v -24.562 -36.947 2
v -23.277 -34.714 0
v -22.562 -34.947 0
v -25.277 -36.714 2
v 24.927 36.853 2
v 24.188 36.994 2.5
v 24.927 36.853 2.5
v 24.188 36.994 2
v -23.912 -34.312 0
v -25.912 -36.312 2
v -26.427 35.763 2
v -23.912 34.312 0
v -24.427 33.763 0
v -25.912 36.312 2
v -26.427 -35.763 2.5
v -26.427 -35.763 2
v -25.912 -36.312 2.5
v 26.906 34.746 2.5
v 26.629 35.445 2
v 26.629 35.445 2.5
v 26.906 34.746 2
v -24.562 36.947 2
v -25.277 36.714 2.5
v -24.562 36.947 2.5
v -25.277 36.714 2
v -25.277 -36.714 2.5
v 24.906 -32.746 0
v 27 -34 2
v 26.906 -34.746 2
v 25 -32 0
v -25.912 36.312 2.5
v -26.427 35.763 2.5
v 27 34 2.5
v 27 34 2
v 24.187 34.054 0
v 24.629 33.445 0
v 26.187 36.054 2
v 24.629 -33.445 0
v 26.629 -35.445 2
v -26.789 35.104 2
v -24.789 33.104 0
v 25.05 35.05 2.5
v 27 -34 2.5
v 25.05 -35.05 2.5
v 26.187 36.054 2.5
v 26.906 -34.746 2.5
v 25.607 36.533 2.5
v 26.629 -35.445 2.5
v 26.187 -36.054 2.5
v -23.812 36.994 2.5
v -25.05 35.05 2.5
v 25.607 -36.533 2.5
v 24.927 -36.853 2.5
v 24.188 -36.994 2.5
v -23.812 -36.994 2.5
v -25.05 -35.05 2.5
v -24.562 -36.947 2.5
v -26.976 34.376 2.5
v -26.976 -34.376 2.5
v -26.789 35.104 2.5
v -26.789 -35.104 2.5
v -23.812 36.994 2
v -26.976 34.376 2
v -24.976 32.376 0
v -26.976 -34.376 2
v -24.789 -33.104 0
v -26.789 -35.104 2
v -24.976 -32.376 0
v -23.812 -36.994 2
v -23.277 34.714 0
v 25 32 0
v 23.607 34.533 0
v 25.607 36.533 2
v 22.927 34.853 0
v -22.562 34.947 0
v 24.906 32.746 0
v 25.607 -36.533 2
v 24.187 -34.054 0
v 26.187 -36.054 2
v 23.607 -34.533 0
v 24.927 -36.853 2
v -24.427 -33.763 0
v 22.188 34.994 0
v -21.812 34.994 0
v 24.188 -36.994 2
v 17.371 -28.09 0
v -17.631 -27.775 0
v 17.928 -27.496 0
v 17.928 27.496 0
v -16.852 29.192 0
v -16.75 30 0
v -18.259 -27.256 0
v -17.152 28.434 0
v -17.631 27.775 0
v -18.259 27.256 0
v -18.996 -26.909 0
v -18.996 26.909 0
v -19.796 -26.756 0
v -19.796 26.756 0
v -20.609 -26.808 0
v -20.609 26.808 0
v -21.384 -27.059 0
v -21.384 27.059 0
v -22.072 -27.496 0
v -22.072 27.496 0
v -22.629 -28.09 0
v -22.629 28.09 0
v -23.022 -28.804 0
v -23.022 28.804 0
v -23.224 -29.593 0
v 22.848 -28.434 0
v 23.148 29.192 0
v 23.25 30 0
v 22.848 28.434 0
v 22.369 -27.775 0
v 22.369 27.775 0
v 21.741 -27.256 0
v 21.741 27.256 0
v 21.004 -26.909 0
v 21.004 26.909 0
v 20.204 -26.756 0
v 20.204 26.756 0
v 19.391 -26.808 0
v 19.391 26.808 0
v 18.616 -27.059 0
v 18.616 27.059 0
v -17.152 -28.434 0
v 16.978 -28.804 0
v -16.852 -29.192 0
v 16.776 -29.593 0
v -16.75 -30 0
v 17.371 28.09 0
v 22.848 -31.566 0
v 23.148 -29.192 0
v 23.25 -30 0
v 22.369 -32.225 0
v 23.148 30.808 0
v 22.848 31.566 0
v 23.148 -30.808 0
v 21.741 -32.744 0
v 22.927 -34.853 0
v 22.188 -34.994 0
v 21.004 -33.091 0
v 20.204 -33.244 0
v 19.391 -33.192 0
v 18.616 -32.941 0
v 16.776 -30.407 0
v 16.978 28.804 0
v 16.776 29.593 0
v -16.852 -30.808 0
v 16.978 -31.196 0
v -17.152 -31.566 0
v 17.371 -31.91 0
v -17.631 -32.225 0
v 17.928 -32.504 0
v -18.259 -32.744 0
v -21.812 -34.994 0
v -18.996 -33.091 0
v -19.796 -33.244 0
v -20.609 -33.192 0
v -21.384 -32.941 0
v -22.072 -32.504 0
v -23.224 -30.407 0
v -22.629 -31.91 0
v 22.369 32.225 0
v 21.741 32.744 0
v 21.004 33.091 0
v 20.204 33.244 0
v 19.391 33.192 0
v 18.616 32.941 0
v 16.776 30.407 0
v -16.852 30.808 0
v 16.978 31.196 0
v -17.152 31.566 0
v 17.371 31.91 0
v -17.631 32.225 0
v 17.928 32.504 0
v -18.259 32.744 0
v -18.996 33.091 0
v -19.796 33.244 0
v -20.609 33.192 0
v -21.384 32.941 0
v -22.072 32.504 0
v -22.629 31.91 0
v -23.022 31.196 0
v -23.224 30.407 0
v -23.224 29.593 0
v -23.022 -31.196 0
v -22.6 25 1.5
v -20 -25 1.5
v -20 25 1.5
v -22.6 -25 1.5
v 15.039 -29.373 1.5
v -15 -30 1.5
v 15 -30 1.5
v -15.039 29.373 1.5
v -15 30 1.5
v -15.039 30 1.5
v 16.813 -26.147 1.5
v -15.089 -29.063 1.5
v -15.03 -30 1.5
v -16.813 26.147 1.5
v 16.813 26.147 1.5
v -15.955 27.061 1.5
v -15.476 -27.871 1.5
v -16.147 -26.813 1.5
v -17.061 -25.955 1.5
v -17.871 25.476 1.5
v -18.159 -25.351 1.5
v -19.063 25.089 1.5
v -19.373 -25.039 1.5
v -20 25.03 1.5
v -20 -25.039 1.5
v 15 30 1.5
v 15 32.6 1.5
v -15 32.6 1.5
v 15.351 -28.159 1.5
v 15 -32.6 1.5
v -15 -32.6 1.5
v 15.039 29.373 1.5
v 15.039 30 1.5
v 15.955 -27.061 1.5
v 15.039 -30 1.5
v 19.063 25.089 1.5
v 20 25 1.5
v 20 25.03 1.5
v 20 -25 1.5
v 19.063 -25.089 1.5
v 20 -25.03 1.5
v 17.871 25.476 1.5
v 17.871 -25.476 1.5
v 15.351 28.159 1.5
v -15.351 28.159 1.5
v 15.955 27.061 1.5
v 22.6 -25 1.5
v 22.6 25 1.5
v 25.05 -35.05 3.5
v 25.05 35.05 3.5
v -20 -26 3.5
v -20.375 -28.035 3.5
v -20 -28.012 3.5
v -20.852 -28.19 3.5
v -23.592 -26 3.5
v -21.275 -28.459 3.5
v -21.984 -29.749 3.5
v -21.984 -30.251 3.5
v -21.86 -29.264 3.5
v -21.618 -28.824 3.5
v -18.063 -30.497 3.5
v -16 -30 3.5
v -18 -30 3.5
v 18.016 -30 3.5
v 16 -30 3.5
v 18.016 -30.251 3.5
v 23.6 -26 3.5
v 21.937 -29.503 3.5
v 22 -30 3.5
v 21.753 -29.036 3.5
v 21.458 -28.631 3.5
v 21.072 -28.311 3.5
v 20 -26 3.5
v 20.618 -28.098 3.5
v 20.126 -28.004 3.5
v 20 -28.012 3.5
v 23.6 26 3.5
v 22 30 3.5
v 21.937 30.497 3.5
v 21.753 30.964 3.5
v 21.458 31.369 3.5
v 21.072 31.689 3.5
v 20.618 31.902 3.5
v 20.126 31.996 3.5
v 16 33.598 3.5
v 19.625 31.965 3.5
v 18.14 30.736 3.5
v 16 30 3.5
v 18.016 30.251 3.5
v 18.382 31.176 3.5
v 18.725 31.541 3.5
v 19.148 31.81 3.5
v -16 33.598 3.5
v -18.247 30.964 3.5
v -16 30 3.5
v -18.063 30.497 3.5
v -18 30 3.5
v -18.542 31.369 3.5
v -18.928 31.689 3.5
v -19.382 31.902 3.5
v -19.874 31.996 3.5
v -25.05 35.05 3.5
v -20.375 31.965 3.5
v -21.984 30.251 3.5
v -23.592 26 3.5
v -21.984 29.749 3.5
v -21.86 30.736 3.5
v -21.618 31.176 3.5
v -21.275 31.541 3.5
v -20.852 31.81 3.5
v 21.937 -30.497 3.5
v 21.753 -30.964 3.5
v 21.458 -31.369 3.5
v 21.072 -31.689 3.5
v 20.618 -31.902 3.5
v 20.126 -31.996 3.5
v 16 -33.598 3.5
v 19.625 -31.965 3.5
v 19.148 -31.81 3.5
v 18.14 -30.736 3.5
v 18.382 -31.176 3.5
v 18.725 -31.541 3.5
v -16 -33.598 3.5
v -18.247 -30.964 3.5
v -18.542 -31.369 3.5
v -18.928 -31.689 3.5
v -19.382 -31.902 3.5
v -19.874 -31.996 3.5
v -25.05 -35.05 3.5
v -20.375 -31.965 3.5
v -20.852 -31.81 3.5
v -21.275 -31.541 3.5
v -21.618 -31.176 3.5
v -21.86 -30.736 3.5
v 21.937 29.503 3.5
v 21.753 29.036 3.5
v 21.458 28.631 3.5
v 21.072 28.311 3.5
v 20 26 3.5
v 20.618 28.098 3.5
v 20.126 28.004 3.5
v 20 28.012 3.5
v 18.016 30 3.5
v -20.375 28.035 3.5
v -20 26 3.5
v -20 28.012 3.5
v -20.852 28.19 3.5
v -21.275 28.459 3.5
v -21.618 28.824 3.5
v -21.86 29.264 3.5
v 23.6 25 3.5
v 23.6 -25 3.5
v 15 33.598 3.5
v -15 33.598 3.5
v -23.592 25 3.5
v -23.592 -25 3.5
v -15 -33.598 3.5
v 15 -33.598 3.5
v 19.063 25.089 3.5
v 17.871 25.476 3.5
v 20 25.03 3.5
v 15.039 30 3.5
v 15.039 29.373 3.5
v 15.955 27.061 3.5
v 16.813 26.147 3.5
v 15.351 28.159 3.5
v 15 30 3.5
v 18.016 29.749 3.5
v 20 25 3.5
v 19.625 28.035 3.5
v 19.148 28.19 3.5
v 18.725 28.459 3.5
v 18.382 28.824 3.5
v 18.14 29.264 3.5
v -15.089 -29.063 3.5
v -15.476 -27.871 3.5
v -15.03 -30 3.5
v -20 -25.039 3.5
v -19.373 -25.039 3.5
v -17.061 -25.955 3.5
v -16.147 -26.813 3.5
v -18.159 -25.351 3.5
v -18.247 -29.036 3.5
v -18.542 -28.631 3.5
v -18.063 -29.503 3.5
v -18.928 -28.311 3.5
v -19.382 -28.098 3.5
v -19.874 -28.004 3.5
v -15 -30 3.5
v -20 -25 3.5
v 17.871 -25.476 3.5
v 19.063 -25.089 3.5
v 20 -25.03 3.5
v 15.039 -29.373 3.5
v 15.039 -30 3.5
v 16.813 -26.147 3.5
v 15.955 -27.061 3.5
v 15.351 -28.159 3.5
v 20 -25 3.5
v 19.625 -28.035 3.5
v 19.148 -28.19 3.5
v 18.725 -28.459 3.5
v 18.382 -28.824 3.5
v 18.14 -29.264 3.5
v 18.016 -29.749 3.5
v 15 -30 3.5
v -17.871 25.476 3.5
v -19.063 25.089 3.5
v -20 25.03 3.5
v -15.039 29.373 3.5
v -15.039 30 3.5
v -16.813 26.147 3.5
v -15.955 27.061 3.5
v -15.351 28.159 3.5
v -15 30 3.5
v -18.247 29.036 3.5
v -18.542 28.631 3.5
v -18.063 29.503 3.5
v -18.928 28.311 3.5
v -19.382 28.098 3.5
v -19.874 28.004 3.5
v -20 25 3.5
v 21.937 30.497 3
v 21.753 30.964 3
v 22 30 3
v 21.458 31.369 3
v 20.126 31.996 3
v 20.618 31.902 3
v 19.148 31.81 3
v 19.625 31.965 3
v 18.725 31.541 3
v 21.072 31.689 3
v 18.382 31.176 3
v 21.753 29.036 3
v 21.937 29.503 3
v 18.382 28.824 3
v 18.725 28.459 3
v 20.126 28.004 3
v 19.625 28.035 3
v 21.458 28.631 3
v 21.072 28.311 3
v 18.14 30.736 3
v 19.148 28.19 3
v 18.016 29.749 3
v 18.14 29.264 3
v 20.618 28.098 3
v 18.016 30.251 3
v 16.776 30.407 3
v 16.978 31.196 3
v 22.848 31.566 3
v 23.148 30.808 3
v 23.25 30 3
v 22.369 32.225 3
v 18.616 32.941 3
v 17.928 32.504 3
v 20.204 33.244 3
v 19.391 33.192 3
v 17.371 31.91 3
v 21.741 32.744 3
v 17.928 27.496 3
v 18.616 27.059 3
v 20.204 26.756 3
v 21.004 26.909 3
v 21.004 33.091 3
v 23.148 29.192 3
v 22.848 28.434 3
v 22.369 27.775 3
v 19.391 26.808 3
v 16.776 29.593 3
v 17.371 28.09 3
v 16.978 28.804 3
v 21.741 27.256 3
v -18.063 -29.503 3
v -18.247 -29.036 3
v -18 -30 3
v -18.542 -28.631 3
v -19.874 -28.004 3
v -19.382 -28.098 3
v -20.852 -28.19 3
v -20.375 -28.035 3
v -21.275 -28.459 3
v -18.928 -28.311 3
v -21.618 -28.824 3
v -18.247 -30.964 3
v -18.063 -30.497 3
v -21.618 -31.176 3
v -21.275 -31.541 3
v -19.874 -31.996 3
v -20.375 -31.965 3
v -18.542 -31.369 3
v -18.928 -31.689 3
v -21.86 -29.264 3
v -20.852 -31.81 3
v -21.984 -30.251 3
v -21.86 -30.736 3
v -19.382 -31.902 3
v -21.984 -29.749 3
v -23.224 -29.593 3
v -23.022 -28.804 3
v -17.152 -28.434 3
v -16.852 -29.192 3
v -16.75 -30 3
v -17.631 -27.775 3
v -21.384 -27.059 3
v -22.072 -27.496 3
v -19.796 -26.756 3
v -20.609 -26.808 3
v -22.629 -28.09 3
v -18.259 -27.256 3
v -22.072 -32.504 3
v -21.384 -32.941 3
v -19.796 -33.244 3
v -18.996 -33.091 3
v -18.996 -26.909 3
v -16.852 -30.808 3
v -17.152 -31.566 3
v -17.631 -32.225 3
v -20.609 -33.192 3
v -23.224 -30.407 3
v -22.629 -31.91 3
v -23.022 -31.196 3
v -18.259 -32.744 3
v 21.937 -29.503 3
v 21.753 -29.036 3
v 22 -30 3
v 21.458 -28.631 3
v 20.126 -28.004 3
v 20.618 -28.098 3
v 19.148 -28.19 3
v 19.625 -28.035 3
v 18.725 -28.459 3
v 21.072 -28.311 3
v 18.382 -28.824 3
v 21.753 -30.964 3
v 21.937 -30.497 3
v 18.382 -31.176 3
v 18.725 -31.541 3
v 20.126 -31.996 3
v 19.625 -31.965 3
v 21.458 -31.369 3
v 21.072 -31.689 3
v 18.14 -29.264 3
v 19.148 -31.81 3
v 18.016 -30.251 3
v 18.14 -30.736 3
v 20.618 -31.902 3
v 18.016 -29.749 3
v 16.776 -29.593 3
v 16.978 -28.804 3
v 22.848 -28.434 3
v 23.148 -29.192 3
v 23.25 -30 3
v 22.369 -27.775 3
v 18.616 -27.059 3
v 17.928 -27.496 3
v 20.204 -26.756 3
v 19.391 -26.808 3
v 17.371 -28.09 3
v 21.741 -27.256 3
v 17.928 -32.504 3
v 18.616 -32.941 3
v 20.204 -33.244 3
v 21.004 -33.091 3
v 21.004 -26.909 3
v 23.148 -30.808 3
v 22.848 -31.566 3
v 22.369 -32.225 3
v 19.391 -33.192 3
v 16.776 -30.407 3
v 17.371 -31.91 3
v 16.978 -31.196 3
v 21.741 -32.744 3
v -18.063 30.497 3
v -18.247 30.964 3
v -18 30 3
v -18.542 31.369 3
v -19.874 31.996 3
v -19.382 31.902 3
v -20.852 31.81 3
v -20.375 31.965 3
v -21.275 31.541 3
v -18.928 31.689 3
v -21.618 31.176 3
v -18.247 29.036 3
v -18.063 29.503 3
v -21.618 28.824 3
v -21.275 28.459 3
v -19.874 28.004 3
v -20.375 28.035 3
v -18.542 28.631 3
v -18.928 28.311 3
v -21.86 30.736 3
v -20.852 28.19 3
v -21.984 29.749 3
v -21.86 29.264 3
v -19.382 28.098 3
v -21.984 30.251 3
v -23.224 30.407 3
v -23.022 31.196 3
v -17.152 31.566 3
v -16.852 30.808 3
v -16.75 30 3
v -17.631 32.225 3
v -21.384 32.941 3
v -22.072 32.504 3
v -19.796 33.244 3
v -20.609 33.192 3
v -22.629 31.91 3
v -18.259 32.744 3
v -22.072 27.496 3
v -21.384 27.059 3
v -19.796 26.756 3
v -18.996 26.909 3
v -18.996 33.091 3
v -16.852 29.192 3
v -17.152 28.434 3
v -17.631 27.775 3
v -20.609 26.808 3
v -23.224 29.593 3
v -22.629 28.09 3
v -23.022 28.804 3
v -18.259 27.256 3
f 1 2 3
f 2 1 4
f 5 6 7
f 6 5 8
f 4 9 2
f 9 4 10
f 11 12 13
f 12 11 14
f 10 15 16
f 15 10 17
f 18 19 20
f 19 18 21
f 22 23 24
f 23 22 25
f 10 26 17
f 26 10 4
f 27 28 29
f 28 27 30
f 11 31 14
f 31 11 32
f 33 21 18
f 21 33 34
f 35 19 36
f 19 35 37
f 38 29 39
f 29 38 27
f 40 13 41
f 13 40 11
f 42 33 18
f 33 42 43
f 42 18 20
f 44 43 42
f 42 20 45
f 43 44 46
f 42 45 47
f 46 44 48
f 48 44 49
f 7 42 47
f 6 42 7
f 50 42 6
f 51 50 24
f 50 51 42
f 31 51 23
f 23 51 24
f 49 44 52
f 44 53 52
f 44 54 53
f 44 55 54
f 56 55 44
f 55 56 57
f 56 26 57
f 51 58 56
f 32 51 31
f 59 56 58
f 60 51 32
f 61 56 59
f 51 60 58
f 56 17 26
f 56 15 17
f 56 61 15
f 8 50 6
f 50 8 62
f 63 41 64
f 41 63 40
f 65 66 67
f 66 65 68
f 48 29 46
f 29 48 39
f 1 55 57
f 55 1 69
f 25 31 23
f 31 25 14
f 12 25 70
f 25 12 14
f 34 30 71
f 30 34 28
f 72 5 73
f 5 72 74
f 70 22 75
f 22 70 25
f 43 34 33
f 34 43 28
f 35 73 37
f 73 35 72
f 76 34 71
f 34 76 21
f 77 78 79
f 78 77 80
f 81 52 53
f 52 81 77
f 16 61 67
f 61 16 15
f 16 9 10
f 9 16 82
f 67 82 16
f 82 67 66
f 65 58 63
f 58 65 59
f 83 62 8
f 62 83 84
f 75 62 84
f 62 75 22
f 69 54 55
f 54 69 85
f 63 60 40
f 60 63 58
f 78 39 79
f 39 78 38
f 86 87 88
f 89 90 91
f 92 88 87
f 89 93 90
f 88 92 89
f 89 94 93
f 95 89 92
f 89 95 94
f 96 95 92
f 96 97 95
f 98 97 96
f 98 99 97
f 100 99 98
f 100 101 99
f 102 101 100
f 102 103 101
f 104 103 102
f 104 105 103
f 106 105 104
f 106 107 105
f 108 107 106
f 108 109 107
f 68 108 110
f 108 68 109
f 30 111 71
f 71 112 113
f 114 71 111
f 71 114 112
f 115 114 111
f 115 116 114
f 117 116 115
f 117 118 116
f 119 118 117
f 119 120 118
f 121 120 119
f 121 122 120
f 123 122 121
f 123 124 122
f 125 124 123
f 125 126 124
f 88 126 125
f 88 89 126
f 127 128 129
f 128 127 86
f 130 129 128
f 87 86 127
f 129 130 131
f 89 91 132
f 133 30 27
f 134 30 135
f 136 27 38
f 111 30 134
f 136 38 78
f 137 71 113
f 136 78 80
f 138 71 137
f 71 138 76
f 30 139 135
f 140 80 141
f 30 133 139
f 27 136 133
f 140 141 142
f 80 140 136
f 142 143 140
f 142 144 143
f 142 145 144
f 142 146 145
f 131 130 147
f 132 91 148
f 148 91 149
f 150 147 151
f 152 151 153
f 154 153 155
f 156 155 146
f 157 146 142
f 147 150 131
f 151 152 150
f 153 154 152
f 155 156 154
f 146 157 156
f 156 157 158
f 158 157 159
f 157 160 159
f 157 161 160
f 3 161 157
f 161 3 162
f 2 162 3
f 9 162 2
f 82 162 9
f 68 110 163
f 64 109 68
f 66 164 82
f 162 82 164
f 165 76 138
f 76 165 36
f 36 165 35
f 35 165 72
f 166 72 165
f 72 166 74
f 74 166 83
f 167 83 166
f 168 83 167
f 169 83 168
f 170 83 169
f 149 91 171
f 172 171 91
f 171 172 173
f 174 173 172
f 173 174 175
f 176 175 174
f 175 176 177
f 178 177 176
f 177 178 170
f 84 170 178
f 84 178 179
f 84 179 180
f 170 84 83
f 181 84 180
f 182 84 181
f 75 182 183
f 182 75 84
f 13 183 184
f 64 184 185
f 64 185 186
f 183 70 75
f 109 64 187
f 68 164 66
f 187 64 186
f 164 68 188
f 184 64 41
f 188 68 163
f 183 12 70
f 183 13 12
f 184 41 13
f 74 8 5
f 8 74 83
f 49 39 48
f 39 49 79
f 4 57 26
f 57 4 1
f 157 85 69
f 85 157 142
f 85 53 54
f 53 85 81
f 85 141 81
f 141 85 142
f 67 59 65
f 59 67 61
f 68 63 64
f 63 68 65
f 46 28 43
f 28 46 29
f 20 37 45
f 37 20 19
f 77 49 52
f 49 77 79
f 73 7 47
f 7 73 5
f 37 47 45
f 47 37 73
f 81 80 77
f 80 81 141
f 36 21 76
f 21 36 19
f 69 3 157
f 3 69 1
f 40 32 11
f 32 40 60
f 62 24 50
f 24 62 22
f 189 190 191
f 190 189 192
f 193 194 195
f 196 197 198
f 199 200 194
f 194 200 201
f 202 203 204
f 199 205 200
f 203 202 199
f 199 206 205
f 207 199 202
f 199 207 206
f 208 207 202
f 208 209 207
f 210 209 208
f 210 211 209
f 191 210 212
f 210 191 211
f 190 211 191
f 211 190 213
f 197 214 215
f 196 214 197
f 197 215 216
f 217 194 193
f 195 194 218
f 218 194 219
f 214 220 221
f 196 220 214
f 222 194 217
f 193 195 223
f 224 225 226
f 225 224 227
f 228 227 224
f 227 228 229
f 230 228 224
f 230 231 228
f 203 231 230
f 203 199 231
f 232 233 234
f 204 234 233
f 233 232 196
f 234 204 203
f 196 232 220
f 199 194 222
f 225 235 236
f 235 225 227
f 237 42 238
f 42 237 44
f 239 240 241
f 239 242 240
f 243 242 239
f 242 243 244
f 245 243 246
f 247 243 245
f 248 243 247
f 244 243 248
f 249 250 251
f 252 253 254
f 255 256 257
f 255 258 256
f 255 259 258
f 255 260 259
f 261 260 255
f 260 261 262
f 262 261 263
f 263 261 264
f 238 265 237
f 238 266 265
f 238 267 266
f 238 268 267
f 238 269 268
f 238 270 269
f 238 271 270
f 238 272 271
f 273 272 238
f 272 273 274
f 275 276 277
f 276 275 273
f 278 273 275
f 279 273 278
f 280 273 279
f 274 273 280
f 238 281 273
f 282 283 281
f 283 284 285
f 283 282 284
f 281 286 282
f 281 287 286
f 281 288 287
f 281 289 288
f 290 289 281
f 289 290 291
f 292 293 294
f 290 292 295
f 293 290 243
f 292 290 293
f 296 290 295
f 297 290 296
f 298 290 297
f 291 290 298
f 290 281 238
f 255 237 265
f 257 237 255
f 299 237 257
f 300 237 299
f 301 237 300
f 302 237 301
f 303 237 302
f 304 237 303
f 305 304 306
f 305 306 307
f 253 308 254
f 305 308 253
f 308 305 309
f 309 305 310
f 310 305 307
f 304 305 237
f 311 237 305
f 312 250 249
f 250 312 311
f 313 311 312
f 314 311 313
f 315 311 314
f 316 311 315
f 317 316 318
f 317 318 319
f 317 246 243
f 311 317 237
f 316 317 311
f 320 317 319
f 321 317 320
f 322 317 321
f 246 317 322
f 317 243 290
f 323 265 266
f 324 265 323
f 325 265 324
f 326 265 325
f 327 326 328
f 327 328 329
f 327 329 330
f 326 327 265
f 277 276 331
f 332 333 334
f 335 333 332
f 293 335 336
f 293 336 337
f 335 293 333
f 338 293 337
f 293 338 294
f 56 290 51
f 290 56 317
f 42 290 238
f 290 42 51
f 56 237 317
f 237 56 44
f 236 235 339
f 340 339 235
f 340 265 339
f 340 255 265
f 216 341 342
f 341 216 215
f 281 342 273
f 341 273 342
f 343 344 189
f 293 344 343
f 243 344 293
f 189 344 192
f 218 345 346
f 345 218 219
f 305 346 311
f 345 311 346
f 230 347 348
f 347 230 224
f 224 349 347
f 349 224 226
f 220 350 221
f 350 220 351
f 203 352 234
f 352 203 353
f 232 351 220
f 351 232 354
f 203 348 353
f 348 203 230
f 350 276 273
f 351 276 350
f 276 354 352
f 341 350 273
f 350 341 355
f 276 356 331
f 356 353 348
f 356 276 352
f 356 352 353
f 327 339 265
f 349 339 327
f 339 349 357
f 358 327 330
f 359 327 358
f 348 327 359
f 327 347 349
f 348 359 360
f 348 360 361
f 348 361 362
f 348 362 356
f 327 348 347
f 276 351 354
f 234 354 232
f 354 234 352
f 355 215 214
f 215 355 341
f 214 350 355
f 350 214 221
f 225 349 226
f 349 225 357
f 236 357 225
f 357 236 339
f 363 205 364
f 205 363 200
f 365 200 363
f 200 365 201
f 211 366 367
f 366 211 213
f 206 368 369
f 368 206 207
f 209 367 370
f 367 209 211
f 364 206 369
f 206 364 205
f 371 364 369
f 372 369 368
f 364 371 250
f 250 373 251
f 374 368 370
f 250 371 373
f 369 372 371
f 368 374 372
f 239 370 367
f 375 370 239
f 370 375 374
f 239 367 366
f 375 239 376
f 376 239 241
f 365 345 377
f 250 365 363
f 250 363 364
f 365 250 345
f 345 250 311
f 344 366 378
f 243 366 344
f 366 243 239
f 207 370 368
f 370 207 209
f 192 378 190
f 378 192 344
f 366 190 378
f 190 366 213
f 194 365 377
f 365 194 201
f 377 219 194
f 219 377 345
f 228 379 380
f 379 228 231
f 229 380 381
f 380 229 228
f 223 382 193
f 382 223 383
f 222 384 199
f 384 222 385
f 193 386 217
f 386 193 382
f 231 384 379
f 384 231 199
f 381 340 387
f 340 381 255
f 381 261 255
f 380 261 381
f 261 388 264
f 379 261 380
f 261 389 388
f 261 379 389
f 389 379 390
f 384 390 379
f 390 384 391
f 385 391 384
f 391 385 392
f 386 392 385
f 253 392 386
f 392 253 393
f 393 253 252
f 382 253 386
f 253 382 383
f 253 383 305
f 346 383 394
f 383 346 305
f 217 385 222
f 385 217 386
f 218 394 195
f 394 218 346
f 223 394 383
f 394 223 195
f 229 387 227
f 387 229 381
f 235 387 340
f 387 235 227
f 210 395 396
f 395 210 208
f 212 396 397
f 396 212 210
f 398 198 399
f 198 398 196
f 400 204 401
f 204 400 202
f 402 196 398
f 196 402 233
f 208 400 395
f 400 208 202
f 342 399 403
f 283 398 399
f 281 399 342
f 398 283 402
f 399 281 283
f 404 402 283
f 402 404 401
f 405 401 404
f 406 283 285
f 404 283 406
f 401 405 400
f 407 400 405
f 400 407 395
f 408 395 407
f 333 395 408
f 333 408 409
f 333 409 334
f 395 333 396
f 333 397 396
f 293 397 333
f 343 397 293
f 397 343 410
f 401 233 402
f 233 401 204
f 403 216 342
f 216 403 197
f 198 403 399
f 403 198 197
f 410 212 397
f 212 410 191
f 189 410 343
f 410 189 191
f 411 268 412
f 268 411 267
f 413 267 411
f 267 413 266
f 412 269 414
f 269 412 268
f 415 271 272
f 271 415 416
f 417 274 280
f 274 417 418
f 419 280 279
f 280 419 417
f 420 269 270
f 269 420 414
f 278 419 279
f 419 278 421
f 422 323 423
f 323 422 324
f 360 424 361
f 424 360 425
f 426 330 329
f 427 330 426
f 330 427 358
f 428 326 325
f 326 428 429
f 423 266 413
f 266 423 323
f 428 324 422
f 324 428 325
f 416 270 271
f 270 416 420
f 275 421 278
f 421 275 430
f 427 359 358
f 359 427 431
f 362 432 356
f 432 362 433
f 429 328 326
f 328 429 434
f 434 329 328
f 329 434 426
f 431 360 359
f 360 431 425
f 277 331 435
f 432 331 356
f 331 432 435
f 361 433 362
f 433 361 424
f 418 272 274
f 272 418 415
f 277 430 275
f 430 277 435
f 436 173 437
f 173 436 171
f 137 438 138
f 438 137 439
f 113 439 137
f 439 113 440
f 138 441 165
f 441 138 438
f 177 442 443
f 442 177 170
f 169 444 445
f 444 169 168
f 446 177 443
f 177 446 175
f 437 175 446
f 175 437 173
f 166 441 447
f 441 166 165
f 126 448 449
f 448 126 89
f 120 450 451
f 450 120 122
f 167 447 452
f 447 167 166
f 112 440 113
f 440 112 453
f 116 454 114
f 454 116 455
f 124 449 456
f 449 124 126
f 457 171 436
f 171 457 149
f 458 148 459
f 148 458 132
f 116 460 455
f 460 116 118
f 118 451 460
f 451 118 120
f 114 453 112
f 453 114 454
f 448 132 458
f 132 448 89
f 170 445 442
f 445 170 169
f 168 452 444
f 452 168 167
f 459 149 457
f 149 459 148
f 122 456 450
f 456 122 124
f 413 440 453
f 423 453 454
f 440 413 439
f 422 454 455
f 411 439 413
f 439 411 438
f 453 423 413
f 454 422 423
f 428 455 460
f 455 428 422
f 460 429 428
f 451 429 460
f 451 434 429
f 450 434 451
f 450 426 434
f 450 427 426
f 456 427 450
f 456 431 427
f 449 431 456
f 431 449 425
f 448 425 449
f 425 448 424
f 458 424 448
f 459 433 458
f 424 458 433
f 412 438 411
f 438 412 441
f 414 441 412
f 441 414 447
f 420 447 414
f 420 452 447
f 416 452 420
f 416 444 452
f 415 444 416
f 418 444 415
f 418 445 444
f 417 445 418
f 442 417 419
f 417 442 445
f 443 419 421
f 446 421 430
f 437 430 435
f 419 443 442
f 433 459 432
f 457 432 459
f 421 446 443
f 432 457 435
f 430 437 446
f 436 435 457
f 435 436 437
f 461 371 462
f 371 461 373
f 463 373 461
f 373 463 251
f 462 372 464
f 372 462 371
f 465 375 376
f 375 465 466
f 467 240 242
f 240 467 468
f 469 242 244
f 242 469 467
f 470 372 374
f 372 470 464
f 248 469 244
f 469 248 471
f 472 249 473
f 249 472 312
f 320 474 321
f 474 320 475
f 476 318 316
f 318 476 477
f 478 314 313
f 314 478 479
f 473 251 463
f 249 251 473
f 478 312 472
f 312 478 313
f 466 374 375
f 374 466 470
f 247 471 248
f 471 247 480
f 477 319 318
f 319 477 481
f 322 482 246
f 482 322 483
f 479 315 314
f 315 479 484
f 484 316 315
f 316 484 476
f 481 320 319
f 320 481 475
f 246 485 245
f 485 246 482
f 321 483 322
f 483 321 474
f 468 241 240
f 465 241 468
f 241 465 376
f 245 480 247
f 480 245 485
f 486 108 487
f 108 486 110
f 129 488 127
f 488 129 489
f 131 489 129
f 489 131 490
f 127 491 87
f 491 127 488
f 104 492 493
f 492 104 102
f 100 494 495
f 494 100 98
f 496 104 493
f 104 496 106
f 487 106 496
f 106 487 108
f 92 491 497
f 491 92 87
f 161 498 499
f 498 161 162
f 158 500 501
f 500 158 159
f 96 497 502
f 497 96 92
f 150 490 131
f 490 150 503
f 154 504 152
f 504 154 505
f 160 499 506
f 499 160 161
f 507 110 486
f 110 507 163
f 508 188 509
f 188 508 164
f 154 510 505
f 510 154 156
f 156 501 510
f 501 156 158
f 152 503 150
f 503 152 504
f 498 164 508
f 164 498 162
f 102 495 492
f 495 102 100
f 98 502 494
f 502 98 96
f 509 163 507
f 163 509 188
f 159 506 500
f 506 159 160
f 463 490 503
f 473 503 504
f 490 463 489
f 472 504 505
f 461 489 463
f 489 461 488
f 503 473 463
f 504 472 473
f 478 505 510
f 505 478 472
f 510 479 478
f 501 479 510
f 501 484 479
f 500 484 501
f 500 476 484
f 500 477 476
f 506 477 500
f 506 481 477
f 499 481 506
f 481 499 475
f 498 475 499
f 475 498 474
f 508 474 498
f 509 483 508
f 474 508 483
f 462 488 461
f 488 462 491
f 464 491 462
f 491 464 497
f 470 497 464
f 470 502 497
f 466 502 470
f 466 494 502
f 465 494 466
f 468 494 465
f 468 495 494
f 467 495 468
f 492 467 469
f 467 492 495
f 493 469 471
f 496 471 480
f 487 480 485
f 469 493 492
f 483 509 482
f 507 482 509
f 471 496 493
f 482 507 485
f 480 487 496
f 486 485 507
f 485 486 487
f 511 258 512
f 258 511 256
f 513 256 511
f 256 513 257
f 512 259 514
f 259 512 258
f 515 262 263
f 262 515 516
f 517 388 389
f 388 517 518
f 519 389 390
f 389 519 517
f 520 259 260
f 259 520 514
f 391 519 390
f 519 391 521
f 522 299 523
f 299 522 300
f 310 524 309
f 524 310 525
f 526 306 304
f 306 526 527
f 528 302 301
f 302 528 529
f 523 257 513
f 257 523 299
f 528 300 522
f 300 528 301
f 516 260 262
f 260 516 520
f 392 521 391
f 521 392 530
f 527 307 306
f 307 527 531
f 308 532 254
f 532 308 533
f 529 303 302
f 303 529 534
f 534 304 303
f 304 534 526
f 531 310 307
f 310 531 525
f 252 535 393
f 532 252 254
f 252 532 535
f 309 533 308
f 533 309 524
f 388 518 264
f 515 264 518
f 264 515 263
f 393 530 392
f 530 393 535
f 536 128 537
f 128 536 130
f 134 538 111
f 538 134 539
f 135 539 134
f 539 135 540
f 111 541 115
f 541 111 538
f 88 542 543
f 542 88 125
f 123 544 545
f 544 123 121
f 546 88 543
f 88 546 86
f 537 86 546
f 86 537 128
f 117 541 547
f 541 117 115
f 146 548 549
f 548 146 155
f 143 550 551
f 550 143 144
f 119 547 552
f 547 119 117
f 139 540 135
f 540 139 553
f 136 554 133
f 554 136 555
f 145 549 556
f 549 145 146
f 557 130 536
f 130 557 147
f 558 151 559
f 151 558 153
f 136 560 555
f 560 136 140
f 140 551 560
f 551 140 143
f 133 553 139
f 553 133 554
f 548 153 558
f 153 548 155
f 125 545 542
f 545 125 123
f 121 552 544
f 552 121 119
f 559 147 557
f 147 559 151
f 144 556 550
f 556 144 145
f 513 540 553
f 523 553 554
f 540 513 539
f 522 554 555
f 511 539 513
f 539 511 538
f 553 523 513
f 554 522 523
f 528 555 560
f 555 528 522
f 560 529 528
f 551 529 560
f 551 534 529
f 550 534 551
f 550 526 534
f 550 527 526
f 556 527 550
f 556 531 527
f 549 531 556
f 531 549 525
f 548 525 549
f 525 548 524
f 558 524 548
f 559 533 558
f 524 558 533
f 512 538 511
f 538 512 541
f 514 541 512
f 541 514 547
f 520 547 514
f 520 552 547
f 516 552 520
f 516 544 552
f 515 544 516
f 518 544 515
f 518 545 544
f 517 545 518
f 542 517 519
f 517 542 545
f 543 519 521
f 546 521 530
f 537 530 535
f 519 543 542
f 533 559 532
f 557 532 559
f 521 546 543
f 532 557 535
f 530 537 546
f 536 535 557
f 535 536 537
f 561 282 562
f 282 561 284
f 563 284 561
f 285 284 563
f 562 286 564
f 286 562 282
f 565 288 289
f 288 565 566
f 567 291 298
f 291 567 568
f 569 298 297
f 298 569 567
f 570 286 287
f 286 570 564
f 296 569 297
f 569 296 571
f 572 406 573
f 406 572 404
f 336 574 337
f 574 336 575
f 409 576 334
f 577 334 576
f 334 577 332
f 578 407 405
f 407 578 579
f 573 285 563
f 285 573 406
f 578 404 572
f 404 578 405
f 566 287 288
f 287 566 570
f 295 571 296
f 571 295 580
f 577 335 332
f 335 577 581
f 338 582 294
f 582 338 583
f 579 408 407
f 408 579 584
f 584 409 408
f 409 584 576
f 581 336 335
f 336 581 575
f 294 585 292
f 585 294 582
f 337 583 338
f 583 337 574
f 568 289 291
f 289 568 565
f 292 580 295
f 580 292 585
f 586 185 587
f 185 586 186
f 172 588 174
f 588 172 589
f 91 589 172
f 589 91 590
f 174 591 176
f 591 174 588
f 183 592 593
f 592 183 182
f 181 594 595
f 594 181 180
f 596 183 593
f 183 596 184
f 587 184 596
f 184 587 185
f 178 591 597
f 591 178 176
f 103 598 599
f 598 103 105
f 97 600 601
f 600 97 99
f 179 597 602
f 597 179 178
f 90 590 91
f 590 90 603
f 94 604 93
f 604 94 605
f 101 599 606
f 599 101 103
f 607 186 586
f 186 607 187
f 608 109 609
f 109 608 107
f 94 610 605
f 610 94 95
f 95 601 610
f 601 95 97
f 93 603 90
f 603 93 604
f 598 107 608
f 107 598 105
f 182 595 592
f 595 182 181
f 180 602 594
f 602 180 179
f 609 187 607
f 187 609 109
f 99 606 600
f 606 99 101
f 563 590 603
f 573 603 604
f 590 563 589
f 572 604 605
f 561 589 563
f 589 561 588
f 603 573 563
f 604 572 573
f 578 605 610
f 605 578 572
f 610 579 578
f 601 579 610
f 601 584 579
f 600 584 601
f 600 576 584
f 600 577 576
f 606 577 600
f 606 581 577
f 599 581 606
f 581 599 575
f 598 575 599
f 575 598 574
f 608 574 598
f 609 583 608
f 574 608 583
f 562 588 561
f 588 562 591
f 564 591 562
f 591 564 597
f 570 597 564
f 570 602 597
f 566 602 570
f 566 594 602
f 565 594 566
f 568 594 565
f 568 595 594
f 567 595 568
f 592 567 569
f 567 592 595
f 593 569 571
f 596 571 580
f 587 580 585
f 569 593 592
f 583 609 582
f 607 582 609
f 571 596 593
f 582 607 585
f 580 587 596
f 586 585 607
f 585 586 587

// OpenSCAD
/* A small, arbitrary unit to guard against rounding errors */
eps = 0.1;
alot = 1000;

/* Base PCB size */
pcb_width = 50;
pcb_height = 70;
/* Extra space around PCB */
pcb_extra = 1;

/* Offset of screw hole centers from left/right/top/bottom side of board */
screw_offx_l = 5;
screw_offx_r = 5;
screw_offx_t = 5;
screw_offx_b = 5;

/* Thickness of bottom, walls, lid (middle sections) */
bottom_thickness = 1.5;
wall_thickness = 1.5;
lid_thickness = 1.5;

/* Outside corner radius */
corner_radius_wall = 3;
corner_radius_lid = 2;

screw_base_dia = 8;
screw_base_h = 5;
screw_nut_dia = 5.4;
screw_nut_h = 6;
screw_hole_dia = 4.0;
screw_hole_h = 6;
board_thickness = 1.6;
height_above_board = 18;
height_lid_inner = 1;
lid_lip_depth = 1;
lid_lip_width = 1;
lid_lip_extra = 1;

clamp_tube_dia = screw_base_dia;
clamp_tube_h = 0; //height_above_board+height_lid_inner;
clamp_tube_base_extra = 2;

screw_head_hole_dia = 6.5;
screw_head_hole_depth = 3;

module rounded_rect(w, h, r) {
    hull(){
        translate([w/2-r, h/2-r]) circle(r);
        translate([-(w/2-r), h/2-r]) circle(r);
        translate([w/2-r, -(h/2-r)]) circle(r);
        translate([-(w/2-r), -(h/2-r)]) circle(r);
    }
}

module shell(thickness, inner_height, inner_extra, radius_horiz) {
    d = thickness + inner_height;
    rh=radius_horiz;
    difference(){
        r = corner_radius_wall;
        w = pcb_width+pcb_extra+2*wall_thickness;
        h = pcb_height+pcb_extra+2*wall_thickness;
        hull() {
            translate([0, 0, rh]) linear_extrude(height=d-rh) rounded_rect(w, h, r);
            linear_extrude(height=eps) rounded_rect(w-2*rh, h-2*rh, r);
        }
        
        iw = pcb_width+inner_extra;
        ih = pcb_height+inner_extra;
        translate([-iw/2, -ih/2, bottom_thickness]) cube([iw, ih, h]);
    }
}

module single_screw_base() {
    translate([0, 0, bottom_thickness-eps]) linear_extrude(height=screw_base_h+eps) {
        circle(d=screw_base_dia);
        translate([-screw_base_dia/2, 0]) square([alot, alot]);
        translate([0, -screw_base_dia/2]) square([alot, alot]);
    }
}

w = pcb_width;
h = pcb_height;
e = pcb_extra;
l = screw_offx_l;
r = screw_offx_r;
t = screw_offx_t;
b = screw_offx_b;
s1_pos = [w/2-l, h/2-b];
s2_pos = [-w/2+r, -h/2+t];
s3_pos = [w/2-l, -h/2+t];
s4_pos = [-w/2+r, h/2-b];
module screw_bases() {
    intersection() {
        union() {
            translate(s1_pos) single_screw_base();
            translate(s2_pos) mirror([1,1,0]) single_screw_base();
            translate(s3_pos) mirror([0,1,0]) single_screw_base();
            translate(s4_pos) mirror([1,0,0]) single_screw_base();
        }
        cube([w+e+eps, h+e+eps, alot], center=true);
    }
}

module single_screw_hole() {
    translate([0, 0, bottom_thickness+screw_base_h+eps])
    mirror([0,0,1])
    union() {
        cylinder(h=screw_nut_h+eps, d=screw_nut_dia);
        cylinder(h=screw_hole_h+eps, d=screw_hole_dia);
    }
}

module screw_holes() {
    translate(s1_pos) single_screw_hole();
    translate(s2_pos) mirror([1,1,0]) single_screw_hole();
    translate(s3_pos) mirror([0,1,0]) single_screw_hole();
    translate(s4_pos) mirror([1,0,0]) single_screw_hole();
}

conn_1_y = 12.0;
conn_1_l = 20.0;
conn_1_h = 7;
conn_2_y =  conn_1_y+conn_1_l+6.0;
conn_2_l = conn_1_l;
conn_2_h = conn_1_h;
conn_pwr_y = 12.5;
conn_pwr_l = 10.0;
conn_pwr_h = 10;
conn_extra = 1;
module conn_holes() {
    e = conn_extra;
    translate([0, -e/2, -e/2])
    translate([0, 0, bottom_thickness+screw_base_h+board_thickness])
    translate([-pcb_width/2, -pcb_height/2]) {
        translate([-alot, conn_1_y]) cube([alot, conn_1_l+e, conn_1_h+e]);
        translate([-alot, conn_2_y]) cube([alot, conn_2_l+e, conn_2_h+e]);
        translate([0, conn_pwr_y]) cube([alot, conn_pwr_l+e, conn_pwr_h+e]);
    }
}

module base() {
    difference() {
        union() {
            screw_bases();
            shell(bottom_thickness,
                screw_base_h + board_thickness + height_above_board,
                pcb_extra,
                radius_horiz=0);
        }
        screw_holes();
        conn_holes();
    }
}

module single_clamp_stud_part(liph, clamp_tube_h, extra) {
    translate([0, 0, lid_thickness-eps]) union() {
        cylinder(h=clamp_tube_h, d=clamp_tube_dia+extra);
        linear_extrude(height=liph+eps) {
            translate([-clamp_tube_dia/2-extra/2, 0]) square([alot, alot]);
            translate([0, -clamp_tube_dia/2-extra/2]) square([alot, alot]);
        }
    }
}

module single_clamp_stud(liph) {
    e = clamp_tube_base_extra;
    single_clamp_stud_part(liph, liph+eps, e);
    single_clamp_stud_part(liph, clamp_tube_h, 0);
}

module lid_screw_hole() {
    cylinder(h=alot, d=screw_hole_dia);
    cylinder(h=screw_head_hole_depth+eps, d=screw_head_hole_dia);
}

module lid() {
    e = lid_lip_extra;
    iw = pcb_width+pcb_extra-e+eps;
    ih = pcb_height+pcb_extra-e+eps;
    liph = lid_lip_depth+height_lid_inner;
    difference() {
        union() {
            shell(lid_thickness,
                height_lid_inner,
                inner_extra=-eps,
                radius_horiz=corner_radius_lid);
            difference() {
                translate([-iw/2, -ih/2, lid_thickness-eps]) cube([iw, ih, liph+eps]);
                minkowski() {
                    translate([-iw/2+e/2+liph, -ih/2+e/2+liph, lid_thickness-eps]) cube([iw-e-liph*2, ih-e-liph*2, eps]);
                    cylinder(d1=0, d2=2*liph+2*eps, h=2*liph+2*eps);
                };
            }
            intersection() {
                translate([-iw/2, -ih/2, lid_thickness-eps]) cube([iw, ih, alot]);
                union() {
                    translate(s1_pos) single_clamp_stud(liph);
                    translate(s2_pos) mirror([1,1,0]) single_clamp_stud(liph);
                    translate(s3_pos) mirror([0,1,0]) single_clamp_stud(liph);
                    translate(s4_pos) mirror([1,0,0]) single_clamp_stud(liph);
                }
            }
        }
        translate([0, 0, -eps]) {
            translate(s1_pos) lid_screw_hole();
            translate(s2_pos) lid_screw_hole();
            translate(s3_pos) lid_screw_hole();
            translate(s4_pos) lid_screw_hole();
        }
    }
}

module enclosure() {


    intersection() {
        //translate([-pcb_width, -40, 0]) cube (35, 20, 20);
        //translate([-pcb_width-15, 0, 0]) base();
    };


    intersection() {
        //translate([-alot/2, -10, -alot/2]) cube ([alot, 20, alot]);
        union () {
            render()    lid();
            
            render() translate([0,0,eps]) mirror([0,0,1]) intersection() {
                translate([-alot/2, -alot/2, 0]) cube([alot, alot, alot]);
                translate([0,0,-0.2]) scale([0.3, 0.3, 0.04]) surface("depthmap_03.png", center=true);
            };
            
        };
    };

}

enclosure($fn=25);
